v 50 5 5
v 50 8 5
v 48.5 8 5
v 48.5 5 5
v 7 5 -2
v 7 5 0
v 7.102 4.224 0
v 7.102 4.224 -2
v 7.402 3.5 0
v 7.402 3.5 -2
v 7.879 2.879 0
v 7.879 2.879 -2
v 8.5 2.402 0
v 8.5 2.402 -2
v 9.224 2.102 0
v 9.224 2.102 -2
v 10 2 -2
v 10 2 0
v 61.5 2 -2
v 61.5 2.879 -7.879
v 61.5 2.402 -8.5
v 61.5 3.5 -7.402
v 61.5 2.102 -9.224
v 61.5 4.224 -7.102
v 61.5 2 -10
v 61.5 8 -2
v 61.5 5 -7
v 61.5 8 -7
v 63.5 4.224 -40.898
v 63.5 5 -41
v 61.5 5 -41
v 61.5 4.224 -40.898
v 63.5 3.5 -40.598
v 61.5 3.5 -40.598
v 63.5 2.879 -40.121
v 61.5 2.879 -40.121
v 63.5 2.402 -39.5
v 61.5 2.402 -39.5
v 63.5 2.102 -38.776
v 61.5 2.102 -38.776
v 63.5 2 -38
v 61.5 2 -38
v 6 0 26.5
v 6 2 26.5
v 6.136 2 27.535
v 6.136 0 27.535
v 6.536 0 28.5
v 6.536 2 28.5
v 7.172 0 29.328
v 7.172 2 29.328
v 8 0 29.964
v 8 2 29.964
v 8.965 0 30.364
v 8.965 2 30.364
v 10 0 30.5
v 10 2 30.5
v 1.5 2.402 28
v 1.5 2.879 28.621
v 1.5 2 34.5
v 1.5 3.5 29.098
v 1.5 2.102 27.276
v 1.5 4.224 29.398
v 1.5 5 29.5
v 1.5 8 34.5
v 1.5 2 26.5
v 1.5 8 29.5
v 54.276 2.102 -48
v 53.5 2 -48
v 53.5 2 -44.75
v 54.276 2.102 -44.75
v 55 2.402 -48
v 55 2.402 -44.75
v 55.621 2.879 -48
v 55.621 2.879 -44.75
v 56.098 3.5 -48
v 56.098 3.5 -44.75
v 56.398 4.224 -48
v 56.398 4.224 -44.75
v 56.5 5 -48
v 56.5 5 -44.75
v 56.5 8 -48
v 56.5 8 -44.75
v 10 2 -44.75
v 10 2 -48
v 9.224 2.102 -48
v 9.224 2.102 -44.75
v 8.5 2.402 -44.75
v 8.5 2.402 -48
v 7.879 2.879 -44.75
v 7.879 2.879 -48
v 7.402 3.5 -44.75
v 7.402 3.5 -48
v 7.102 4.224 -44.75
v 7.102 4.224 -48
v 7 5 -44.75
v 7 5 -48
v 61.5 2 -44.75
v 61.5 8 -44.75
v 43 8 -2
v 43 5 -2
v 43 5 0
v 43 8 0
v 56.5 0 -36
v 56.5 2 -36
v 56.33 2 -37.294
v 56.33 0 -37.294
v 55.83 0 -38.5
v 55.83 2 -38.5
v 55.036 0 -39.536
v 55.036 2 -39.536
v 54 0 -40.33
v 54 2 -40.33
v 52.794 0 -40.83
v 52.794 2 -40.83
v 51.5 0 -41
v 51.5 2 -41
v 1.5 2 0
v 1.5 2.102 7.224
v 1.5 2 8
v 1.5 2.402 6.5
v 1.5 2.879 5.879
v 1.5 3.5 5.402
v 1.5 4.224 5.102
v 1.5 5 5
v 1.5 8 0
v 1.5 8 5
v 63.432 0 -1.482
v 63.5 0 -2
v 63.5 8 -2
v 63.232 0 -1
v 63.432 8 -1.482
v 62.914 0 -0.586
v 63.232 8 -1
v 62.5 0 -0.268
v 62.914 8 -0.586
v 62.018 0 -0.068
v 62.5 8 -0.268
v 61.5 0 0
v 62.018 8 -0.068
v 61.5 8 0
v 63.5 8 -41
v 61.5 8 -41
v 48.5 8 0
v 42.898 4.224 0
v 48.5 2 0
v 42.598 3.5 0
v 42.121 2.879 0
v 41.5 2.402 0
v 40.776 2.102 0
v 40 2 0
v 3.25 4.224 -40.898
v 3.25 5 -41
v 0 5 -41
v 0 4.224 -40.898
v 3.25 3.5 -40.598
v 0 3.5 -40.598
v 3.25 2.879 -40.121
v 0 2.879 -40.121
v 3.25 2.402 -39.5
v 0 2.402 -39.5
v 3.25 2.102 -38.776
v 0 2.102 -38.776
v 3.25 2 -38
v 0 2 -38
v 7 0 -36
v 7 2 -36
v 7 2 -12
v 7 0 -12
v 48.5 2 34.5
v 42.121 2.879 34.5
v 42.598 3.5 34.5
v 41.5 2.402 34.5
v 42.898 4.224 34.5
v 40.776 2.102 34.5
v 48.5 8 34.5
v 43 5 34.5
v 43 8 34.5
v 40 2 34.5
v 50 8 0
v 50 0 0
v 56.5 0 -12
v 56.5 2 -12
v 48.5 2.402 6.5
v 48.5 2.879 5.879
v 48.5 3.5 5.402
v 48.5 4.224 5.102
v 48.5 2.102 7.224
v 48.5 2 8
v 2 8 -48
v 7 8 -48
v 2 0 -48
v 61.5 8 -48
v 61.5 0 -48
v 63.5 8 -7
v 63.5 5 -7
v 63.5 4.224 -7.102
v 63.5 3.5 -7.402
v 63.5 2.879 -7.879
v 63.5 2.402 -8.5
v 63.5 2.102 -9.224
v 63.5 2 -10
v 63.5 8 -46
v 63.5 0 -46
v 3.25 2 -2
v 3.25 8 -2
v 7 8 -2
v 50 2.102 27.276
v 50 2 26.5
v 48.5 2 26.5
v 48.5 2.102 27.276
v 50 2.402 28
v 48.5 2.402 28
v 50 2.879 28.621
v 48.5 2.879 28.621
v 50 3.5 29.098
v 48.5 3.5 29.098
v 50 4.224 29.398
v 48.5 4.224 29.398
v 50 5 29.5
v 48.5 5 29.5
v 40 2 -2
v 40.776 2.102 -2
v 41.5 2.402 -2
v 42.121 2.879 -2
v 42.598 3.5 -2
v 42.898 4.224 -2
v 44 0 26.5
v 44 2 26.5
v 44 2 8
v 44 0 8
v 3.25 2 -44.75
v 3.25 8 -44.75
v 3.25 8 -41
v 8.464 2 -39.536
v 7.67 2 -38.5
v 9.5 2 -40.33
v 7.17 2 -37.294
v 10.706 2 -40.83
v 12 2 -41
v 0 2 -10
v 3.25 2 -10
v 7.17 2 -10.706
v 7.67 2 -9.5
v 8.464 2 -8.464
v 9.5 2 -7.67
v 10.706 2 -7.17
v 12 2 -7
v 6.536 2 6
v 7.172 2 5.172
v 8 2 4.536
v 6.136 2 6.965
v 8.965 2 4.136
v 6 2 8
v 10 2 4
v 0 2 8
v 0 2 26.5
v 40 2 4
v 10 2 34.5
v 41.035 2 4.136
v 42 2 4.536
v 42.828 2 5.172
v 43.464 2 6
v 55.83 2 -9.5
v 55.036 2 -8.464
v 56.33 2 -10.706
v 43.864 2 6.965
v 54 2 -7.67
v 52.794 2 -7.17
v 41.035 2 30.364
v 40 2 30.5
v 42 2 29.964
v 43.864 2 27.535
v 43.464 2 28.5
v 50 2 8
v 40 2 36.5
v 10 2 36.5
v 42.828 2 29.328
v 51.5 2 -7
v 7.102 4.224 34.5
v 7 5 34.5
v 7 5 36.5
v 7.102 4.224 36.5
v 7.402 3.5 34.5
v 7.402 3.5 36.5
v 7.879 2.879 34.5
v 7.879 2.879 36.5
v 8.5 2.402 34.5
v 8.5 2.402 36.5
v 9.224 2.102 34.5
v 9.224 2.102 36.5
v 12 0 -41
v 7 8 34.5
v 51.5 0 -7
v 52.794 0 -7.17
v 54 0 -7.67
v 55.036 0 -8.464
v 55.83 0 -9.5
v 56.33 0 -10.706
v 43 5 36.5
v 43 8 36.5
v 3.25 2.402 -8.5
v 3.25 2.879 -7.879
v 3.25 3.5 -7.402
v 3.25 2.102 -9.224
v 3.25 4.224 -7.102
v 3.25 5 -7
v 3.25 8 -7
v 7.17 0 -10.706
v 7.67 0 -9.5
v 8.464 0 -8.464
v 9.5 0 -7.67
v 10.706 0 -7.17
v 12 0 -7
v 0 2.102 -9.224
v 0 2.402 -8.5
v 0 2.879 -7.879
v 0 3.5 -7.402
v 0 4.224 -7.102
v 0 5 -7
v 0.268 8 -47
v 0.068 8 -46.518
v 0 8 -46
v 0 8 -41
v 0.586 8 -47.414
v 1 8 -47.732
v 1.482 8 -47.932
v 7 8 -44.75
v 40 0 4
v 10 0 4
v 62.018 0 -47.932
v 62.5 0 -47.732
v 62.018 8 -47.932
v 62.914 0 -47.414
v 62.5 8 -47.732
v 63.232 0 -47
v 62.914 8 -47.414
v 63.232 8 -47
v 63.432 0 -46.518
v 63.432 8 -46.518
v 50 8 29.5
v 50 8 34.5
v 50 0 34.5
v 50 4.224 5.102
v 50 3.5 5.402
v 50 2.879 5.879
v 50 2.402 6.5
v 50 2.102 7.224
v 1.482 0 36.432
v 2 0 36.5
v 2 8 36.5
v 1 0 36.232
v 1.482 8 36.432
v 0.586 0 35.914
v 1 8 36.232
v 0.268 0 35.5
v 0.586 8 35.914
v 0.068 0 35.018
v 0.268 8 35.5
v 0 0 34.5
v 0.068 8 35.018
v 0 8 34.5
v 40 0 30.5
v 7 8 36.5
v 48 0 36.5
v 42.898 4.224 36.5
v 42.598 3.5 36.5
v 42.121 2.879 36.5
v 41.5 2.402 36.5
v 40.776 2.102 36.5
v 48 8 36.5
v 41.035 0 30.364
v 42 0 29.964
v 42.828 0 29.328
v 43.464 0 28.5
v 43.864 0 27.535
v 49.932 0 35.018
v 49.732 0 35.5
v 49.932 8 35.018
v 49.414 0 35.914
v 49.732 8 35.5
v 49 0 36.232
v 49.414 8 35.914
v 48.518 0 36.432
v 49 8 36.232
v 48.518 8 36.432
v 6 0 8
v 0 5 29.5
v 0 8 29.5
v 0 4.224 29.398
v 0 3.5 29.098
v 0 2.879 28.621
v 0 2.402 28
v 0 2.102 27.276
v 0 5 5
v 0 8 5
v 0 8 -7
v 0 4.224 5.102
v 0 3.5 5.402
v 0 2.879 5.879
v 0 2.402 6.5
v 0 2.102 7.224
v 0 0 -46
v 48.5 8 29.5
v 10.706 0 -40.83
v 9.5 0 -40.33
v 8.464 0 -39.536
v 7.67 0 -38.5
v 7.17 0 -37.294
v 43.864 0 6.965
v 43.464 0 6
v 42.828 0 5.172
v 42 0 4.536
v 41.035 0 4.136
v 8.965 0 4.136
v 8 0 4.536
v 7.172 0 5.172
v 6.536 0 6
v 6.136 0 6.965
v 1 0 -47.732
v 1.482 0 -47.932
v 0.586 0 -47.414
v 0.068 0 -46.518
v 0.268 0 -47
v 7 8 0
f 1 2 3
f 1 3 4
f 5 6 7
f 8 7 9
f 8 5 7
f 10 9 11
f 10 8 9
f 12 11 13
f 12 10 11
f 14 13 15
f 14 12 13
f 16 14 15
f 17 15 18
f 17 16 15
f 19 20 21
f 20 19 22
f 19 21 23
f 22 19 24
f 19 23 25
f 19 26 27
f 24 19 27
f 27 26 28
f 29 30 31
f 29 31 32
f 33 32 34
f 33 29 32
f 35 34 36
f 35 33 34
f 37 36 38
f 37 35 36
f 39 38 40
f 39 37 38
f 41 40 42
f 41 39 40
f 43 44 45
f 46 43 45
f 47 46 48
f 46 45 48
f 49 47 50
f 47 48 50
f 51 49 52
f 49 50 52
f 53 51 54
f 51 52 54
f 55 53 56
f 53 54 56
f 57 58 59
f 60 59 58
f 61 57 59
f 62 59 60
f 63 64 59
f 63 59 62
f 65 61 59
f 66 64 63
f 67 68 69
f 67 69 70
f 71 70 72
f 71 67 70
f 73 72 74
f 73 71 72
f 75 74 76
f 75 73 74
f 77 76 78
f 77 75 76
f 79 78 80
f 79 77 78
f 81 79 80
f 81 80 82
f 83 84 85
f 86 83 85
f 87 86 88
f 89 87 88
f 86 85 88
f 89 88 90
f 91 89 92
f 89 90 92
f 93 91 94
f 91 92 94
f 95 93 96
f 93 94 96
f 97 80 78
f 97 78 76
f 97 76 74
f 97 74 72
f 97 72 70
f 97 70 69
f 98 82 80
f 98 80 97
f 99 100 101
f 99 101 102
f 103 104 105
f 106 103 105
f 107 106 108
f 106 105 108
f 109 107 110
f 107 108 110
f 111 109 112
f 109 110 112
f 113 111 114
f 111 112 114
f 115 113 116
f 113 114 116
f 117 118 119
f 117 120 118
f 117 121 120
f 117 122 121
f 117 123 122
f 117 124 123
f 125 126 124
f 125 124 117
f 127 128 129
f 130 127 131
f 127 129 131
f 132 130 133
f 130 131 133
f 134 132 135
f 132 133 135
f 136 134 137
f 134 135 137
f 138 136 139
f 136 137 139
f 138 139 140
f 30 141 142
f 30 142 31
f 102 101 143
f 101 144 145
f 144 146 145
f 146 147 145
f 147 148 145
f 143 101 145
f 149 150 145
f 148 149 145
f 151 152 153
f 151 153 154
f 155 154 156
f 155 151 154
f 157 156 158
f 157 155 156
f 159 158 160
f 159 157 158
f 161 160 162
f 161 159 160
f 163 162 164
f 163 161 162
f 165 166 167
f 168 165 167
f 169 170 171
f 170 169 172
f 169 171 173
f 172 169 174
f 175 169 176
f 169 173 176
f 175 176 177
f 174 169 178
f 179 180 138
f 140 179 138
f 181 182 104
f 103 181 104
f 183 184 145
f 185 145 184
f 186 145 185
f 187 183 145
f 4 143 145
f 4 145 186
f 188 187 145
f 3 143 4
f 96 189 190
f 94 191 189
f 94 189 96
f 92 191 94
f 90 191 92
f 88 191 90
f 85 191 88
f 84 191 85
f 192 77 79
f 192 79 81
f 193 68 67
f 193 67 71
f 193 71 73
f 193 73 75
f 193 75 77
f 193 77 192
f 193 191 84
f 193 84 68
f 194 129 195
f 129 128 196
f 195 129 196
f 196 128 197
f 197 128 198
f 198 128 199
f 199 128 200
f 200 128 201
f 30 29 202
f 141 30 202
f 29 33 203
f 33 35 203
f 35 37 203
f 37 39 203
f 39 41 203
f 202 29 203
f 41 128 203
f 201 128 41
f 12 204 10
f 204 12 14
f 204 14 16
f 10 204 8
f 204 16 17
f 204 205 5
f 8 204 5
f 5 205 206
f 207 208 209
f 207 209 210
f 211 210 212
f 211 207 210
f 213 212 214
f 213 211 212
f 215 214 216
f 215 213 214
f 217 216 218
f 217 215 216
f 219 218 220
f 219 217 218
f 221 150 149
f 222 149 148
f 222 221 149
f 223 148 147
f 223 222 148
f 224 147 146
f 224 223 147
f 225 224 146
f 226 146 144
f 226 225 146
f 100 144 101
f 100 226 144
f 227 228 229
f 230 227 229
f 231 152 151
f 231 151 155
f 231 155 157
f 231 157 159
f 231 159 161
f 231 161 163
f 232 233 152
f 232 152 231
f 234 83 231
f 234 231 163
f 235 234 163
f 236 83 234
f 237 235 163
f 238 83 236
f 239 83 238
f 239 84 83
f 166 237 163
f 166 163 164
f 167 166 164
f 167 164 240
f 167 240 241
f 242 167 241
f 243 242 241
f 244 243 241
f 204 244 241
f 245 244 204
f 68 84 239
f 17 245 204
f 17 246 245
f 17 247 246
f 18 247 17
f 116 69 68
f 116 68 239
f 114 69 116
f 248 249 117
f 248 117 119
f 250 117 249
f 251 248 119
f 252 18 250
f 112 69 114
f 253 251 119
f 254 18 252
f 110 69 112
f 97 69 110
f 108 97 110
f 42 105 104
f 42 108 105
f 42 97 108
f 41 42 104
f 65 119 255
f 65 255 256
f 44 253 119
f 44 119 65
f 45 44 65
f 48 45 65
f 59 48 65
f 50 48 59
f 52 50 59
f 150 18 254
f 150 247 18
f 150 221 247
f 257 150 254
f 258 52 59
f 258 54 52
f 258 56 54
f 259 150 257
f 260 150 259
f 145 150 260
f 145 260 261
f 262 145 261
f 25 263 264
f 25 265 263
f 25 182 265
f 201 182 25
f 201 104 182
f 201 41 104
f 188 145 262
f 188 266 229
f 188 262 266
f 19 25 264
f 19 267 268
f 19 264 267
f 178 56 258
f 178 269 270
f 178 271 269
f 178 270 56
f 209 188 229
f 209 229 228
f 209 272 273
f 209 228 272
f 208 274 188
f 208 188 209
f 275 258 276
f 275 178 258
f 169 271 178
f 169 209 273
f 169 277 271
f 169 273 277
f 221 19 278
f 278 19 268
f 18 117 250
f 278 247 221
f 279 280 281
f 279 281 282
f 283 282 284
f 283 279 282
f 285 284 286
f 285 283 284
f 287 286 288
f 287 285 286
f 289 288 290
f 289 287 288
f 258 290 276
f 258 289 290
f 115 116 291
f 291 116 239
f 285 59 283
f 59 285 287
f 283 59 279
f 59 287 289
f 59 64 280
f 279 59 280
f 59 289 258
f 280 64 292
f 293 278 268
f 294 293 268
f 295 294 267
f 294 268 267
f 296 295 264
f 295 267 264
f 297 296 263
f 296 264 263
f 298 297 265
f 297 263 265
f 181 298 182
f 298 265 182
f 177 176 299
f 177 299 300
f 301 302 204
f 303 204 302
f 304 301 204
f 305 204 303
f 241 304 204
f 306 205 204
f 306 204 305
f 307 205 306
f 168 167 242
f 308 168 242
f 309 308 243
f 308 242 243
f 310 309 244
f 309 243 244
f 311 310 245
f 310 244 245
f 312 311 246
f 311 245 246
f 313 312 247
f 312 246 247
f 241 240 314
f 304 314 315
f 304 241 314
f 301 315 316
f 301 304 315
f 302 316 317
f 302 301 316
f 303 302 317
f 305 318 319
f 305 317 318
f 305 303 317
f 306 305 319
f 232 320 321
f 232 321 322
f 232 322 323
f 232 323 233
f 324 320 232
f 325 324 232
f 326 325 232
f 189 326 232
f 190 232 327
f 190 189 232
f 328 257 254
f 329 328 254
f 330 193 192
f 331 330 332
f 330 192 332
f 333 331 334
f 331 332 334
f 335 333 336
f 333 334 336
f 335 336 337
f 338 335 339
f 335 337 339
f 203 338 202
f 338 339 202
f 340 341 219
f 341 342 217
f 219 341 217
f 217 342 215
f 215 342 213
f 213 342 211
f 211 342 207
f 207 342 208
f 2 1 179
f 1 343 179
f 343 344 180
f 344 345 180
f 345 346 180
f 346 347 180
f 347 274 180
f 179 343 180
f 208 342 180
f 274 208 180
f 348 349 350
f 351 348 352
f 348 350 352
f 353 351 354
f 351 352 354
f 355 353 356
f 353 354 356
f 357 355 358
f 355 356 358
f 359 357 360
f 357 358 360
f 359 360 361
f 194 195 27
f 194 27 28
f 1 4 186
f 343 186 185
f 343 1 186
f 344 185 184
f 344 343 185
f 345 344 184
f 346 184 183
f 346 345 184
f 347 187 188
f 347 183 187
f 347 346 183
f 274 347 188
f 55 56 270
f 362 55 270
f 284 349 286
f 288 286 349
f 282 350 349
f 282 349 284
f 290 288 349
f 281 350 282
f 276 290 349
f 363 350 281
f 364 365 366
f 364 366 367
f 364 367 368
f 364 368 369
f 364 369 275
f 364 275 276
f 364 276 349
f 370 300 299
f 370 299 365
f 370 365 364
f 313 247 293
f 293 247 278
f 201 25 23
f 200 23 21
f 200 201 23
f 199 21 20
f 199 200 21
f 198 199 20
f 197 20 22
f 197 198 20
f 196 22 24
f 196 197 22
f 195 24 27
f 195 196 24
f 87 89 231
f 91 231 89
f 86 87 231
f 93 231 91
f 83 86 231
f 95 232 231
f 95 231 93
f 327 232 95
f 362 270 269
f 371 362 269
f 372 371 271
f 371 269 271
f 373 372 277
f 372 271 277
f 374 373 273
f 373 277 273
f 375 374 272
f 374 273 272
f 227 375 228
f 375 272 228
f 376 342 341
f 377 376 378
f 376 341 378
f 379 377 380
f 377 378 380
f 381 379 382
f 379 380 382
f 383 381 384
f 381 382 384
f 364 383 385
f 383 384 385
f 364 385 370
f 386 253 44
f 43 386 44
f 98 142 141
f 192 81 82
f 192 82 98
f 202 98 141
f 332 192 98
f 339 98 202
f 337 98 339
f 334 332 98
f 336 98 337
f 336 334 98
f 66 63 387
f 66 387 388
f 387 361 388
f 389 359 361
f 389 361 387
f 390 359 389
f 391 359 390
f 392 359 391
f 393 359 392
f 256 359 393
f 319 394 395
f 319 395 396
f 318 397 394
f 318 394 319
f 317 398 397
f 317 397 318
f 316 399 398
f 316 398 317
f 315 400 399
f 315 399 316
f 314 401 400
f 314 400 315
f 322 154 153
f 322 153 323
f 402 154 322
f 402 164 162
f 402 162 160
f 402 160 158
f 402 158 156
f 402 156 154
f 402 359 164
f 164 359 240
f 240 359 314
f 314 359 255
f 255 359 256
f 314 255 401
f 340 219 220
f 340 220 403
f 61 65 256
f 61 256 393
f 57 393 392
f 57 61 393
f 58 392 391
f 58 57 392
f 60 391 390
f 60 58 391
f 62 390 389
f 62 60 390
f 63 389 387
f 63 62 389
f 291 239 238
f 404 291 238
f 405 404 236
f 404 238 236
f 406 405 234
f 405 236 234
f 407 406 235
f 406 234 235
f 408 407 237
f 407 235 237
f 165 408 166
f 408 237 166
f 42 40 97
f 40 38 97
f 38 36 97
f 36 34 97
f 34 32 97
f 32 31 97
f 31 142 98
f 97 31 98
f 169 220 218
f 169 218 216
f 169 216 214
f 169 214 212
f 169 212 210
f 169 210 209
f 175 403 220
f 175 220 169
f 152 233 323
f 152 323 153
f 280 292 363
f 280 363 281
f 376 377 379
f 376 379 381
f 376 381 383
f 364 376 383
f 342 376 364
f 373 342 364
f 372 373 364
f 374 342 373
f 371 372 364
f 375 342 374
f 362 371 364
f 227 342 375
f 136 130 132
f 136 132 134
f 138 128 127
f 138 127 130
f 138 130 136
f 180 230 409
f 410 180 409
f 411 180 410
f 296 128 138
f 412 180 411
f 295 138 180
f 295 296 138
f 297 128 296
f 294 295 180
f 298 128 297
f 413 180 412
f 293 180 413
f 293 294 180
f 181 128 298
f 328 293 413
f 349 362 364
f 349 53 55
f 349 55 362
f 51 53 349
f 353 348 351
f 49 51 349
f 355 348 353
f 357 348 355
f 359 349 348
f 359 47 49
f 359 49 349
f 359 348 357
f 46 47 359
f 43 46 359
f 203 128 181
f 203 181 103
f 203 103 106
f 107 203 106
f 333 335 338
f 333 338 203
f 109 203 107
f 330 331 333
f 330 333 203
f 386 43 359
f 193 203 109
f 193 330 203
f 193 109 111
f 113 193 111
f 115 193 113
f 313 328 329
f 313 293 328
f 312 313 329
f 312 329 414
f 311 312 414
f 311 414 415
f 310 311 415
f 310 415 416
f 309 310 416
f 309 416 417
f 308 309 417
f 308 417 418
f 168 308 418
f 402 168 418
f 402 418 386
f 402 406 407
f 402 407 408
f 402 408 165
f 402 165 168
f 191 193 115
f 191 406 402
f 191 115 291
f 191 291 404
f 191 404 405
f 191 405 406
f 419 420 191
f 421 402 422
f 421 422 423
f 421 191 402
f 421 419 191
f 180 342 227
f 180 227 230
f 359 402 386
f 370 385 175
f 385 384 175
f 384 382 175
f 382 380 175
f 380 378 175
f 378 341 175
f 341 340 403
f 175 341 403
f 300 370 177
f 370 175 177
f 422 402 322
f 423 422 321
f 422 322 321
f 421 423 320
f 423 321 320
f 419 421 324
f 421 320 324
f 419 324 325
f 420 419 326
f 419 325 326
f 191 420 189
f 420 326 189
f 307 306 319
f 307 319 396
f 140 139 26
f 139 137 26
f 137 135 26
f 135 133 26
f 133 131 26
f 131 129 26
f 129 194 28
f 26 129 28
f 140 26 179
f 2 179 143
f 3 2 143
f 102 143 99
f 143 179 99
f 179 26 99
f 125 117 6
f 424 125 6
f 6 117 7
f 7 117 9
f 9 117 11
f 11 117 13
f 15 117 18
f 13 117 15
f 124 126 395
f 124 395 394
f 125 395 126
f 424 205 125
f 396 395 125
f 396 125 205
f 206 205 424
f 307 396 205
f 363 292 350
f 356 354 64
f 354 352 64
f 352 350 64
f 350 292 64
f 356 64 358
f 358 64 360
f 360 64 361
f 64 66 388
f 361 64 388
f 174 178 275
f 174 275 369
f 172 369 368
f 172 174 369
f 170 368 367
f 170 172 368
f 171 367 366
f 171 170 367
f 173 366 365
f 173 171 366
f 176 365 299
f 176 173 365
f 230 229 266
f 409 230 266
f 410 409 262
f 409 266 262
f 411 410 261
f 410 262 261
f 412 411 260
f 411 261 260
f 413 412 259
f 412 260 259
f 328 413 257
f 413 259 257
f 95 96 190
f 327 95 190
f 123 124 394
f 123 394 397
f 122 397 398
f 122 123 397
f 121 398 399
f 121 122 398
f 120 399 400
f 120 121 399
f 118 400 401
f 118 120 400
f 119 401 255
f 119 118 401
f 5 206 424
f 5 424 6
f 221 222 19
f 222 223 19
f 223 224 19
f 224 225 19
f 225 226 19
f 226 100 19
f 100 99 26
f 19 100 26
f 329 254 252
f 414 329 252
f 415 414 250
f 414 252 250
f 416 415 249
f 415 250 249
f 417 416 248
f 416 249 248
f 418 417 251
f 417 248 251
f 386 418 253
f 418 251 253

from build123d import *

# Parameters (mm, degrees)
SKETCH1_W            = 63.5
SKETCH1_H            = 48
BOSS_EXTRUDE6_DEPTH  = 21
SKETCH5_W            = 50
SKETCH5_H            = 38.5
BOSS_EXTRUDE7_DEPTH  = 11.5
SKETCH6_W            = 59.5
SKETCH6_H            = 44
CUT_EXTRUDE1_DEPTH   = 19
SKETCH7_W            = 46
SKETCH7_H            = 34.5
CUT_EXTRUDE2_DEPTH   = 9.5
SKETCH8_W            = 50
SKETCH8_H            = 11.5
CUT_EXTRUDE4_DEPTH   = 2
CUT_EXTRUDE6_DEPTH   = 2
CUT_EXTRUDE7_DEPTH   = 2
CUT_EXTRUDE10_DEPTH  = 72
CUT_EXTRUDE11_DEPTH  = 38
SKETCH16_W           = 67
SKETCH16_H           = 6.5
CUT_EXTRUDE13_DEPTH  = 79
CUT_EXTRUDE14_DEPTH  = 79
CUT_EXTRUDE15_DEPTH  = 79
FILLET1_R            = 2
FILLET2_R            = 2
FILLET3_R            = 2
FILLET4_R            = 2
FILLET5_R            = 2
SKETCH19_W           = 36.5
SKETCH19_H           = 2
CUT_EXTRUDE17_DEPTH  = 79
FILLET6_R            = 5
FILLET7_R            = 5
SKETCH20_W           = 4
SKETCH20_H           = 2
BOSS_EXTRUDE16_DEPTH = 18
SKETCH30_W           = 4
SKETCH30_H           = 1
BOSS_EXTRUDE17_DEPTH = 2
SKETCH33_W           = 4
SKETCH33_H           = 1.5
BOSS_EXTRUDE18_DEPTH = 4
SKETCH34_W           = 4
SKETCH34_H           = 1
BOSS_EXTRUDE19_DEPTH = 2
SKETCH36_W           = 4
SKETCH36_H           = 1
CUT_EXTRUDE21_DEPTH  = 2
CUT_EXTRUDE22_DEPTH  = 7
CUT_EXTRUDE25_DEPTH  = 7
SKETCH39_W           = 9.212342007
SKETCH39_H           = 18
CUT_EXTRUDE26_DEPTH  = 10
SKETCH40_W           = 63.5
SKETCH40_H           = 6.5
CUT_EXTRUDE27_DEPTH  = 117
SKETCH44_W           = 34.5
SKETCH44_H           = 6
CUT_EXTRUDE30_DEPTH  = 0.5
SKETCH45_W           = 34.5
SKETCH45_H           = 6
CUT_EXTRUDE31_DEPTH  = 0.5
SKETCH46_W           = 44
SKETCH46_H           = 6
BOSS_EXTRUDE20_DEPTH = 1.25
SKETCH47_W           = 58.25
SKETCH47_H           = 6
BOSS_EXTRUDE21_DEPTH = 1.25
CUT_EXTRUDE32_START  = -1.25
CUT_EXTRUDE32_DEPTH  = 1.25
CUT_EXTRUDE33_DEPTH  = 1.25


with BuildPart() as part:
    # Sketch1 → Boss-Extrude6 (new body)
    with BuildSketch(Plane(origin=(0, 0, 0), x_dir=(1, 0, 0), z_dir=(0, 1, 0))):
        with Locations((31.75, 24)):
            Rectangle(SKETCH1_W, SKETCH1_H)
    extrude(amount=BOSS_EXTRUDE6_DEPTH)

    # Sketch5 → Boss-Extrude7 (add)
    with BuildSketch(Plane(origin=(0, 0, 0), x_dir=(-1, 0, 0), z_dir=(0, -1, 0))):
        with Locations((-25, -19.25)):
            Rectangle(SKETCH5_W, SKETCH5_H)
    extrude(amount=-BOSS_EXTRUDE7_DEPTH)

    # Sketch6 → Cut-Extrude1 (cut)
    with BuildSketch(Plane(origin=(0, 21, 0), x_dir=(1, 0, 0), z_dir=(0, 1, 0))):
        with Locations((31.75, 24)):
            Rectangle(SKETCH6_W, SKETCH6_H)
    extrude(amount=-CUT_EXTRUDE1_DEPTH, mode=Mode.SUBTRACT)

    # Sketch7 → Cut-Extrude2 (cut)
    with BuildSketch(Plane(origin=(0, 11.5, 0), x_dir=(1, 0, 0), z_dir=(0, 1, 0))):
        with Locations((25, -17.25)):
            Rectangle(SKETCH7_W, SKETCH7_H)
    extrude(amount=-CUT_EXTRUDE2_DEPTH, mode=Mode.SUBTRACT)

    # Sketch8 → Cut-Extrude4 (cut)
    with BuildSketch(Plane.XY.offset(38.5)):
        with Locations((25, 5.75)):
            Rectangle(SKETCH8_W, SKETCH8_H)
    extrude(amount=-CUT_EXTRUDE4_DEPTH, mode=Mode.SUBTRACT)

    # Sketch10 → Cut-Extrude6 (cut)
    with BuildSketch(Plane(origin=(0, 2, 0), x_dir=(1, 0, 0), z_dir=(0, 1, 0))):
        with BuildLine():
            Line((12, 7), (51.5, 7))
            ThreePointArc((51.5, 7), (55.035533906, 8.464466094), (56.5, 12))
            Line((56.5, 12), (56.5, 36))
            ThreePointArc((56.5, 36), (55.035533906, 39.535533906), (51.5, 41))
            Line((51.5, 41), (12, 41))
            ThreePointArc((12, 41), (8.464466094, 39.535533906), (7, 36))
            Line((7, 36), (7, 12))
            ThreePointArc((7, 12), (8.464466094, 8.464466094), (12, 7))
        make_face()
    extrude(amount=-CUT_EXTRUDE6_DEPTH, mode=Mode.SUBTRACT)

    # Sketch11 → Cut-Extrude7 (cut)
    with BuildSketch(Plane(origin=(0, 2, 0), x_dir=(1, 0, 0), z_dir=(0, 1, 0))):
        with BuildLine():
            Line((10, -30.5), (40, -30.5))
            ThreePointArc((40, -30.5), (42.828427125, -29.328427125), (44, -26.5))
            Line((44, -26.5), (44, -8))
            ThreePointArc((44, -8), (42.828427125, -5.171572875), (40, -4))
            Line((40, -4), (10, -4))
            ThreePointArc((10, -4), (7.171572875, -5.171572875), (6, -8))
            Line((6, -8), (6, -26.5))
            ThreePointArc((6, -26.5), (7.171572875, -29.328427125), (10, -30.5))
        make_face()
    extrude(amount=-CUT_EXTRUDE7_DEPTH, mode=Mode.SUBTRACT)

    # Sketch13 → Cut-Extrude10 (cut)
    with BuildSketch(Plane(origin=(63.5, 0, 0), x_dir=(0, 0, -1), z_dir=(1, 0, 0))):
        with BuildLine():
            Line((7, 21), (41, 21))
            Line((41, 21), (41, 5))
            ThreePointArc((41, 5), (40.121320344, 2.878679656), (38, 2))
            Line((38, 2), (10, 2))
            ThreePointArc((10, 2), (7.878679656, 2.878679656), (7, 5))
            Line((7, 5), (7, 21))
        make_face()
    extrude(amount=-CUT_EXTRUDE10_DEPTH, mode=Mode.SUBTRACT)

    # Sketch14 → Cut-Extrude11 (cut)
    with BuildSketch(Plane(origin=(0, 0, -48), x_dir=(-1, 0, 0), z_dir=(0, 0, -1))):
        with BuildLine():
            Line((-56.5, 21), (-7, 21))
            Line((-7, 21), (-7, 5))
            ThreePointArc((-7, 5), (-7.878679656, 2.878679656), (-10, 2))
            Line((-10, 2), (-53.5, 2))
            ThreePointArc((-53.5, 2), (-55.621320344, 2.878679656), (-56.5, 5))
            Line((-56.5, 5), (-56.5, 21))
        make_face()
    extrude(amount=-CUT_EXTRUDE11_DEPTH, mode=Mode.SUBTRACT)

    # Sketch16 → Cut-Extrude13 (cut)
    with BuildSketch(Plane(origin=(63.5, 0, 0), x_dir=(0, 0, -1), z_dir=(1, 0, 0))):
        with Locations((14.5, 17.75)):
            Rectangle(SKETCH16_W, SKETCH16_H)
    extrude(amount=-CUT_EXTRUDE13_DEPTH, mode=Mode.SUBTRACT)

    # Sketch17 → Cut-Extrude14 (cut)
    with BuildSketch(Plane(origin=(0, 0, -2), x_dir=(-1, 0, 0), z_dir=(0, 0, -1))):
        with BuildLine():
            Line((-43, 14.5), (-7, 14.5))
            Line((-7, 14.5), (-7, 5))
            ThreePointArc((-7, 5), (-7.878679656, 2.878679656), (-10, 2))
            Line((-10, 2), (-40, 2))
            ThreePointArc((-40, 2), (-42.121320344, 2.878679656), (-43, 5))
            Line((-43, 5), (-43, 14.5))
        make_face()
    extrude(amount=-CUT_EXTRUDE14_DEPTH, mode=Mode.SUBTRACT)

    # Sketch18 → Cut-Extrude15 (cut)
    with BuildSketch(Plane(origin=(50, 0, 0), x_dir=(0, 0, -1), z_dir=(1, 0, 0))):
        with BuildLine():
            Line((-29.5, 11.5), (-5, 11.5))
            Line((-5, 11.5), (-5, 5))
            ThreePointArc((-5, 5), (-5.878679656, 2.878679656), (-8, 2))
            Line((-8, 2), (-26.5, 2))
            ThreePointArc((-26.5, 2), (-28.621320344, 2.878679656), (-29.5, 5))
            Line((-29.5, 5), (-29.5, 11.5))
        make_face()
    extrude(amount=-CUT_EXTRUDE15_DEPTH, mode=Mode.SUBTRACT)

    # Fillet1
    fillet1_edges = [part.edges().sort_by_distance(p)[0] for p in [
        (50, 5.75, 36.5),
    ]]
    fillet(fillet1_edges, radius=FILLET1_R)

    # Fillet2
    fillet2_edges = [part.edges().sort_by_distance(p)[0] for p in [
        (0, 5.75, 36.5),
    ]]
    fillet(fillet2_edges, radius=FILLET2_R)

    # Fillet3
    fillet3_edges = [part.edges().sort_by_distance(p)[0] for p in [
        (0, 7.25, -48),
    ]]
    fillet(fillet3_edges, radius=FILLET3_R)

    # Fillet4
    fillet4_edges = [part.edges().sort_by_distance(p)[0] for p in [
        (63.5, 7.25, -48),
    ]]
    fillet(fillet4_edges, radius=FILLET4_R)

    # Fillet5
    fillet5_edges = [part.edges().sort_by_distance(p)[0] for p in [
        (63.5, 7.25, 0),
    ]]
    fillet(fillet5_edges, radius=FILLET5_R)

    # Sketch19 → Cut-Extrude17 (cut)
    with BuildSketch(Plane(origin=(50, 0, 0), x_dir=(0, 0, -1), z_dir=(1, 0, 0))):
        with Locations((-18.25, 10.5)):
            Rectangle(SKETCH19_W, SKETCH19_H)
    extrude(amount=-CUT_EXTRUDE17_DEPTH, mode=Mode.SUBTRACT)

    # Fillet6
    fillet6_edges = [part.edges().sort_by_distance(p)[0] for p in [
        (1, 9.5, 0),
    ]]
    fillet(fillet6_edges, radius=FILLET6_R - 0.0001)  # a hair under: the kernel refuses the full size

    # Fillet7
    fillet7_edges = [part.edges().sort_by_distance(p)[0] for p in [
        (49, 9.5, 0),
    ]]
    fillet(fillet7_edges, radius=FILLET7_R - 0.0001)  # a hair under: the kernel refuses the full size

    # Sketch20 → Boss-Extrude16 (add)
    with BuildSketch(Plane(origin=(0, 2, 0), x_dir=(1, 0, 0), z_dir=(0, 1, 0))):
        with Locations((25, 1)):
            Rectangle(SKETCH20_W, SKETCH20_H)
    extrude(amount=BOSS_EXTRUDE16_DEPTH)

    # Sketch30 → Boss-Extrude17 (add)
    with BuildSketch(Plane.XY):
        with Locations((25, 19.5)):
            Rectangle(SKETCH30_W, SKETCH30_H)
    extrude(amount=BOSS_EXTRUDE17_DEPTH)

    # Sketch33 → Boss-Extrude18 (add)
    with BuildSketch(Plane.XY):
        with Locations((25, 12.75)):
            Rectangle(SKETCH33_W, SKETCH33_H)
    extrude(amount=BOSS_EXTRUDE18_DEPTH)

    # Sketch34 → Boss-Extrude19 (add)
    with BuildSketch(Plane(origin=(0, 0, -2), x_dir=(-1, 0, 0), z_dir=(0, 0, -1))):
        with Locations((-25, 19.5)):
            Rectangle(SKETCH34_W, SKETCH34_H)
    extrude(amount=BOSS_EXTRUDE19_DEPTH)

    # Sketch36 → Cut-Extrude21 (cut)
    with BuildSketch(Plane.XY.offset(2)):
        with Locations((25, 19.5)):
            Rectangle(SKETCH36_W, SKETCH36_H)
    extrude(amount=-CUT_EXTRUDE21_DEPTH, mode=Mode.SUBTRACT)

    # Sketch37 → Cut-Extrude22 (cut)
    with BuildSketch(Plane(origin=(27, 0, 0), x_dir=(0, 0, -1), z_dir=(1, 0, 0))):
        Polygon((0, 20), (4, 19.257089557), (4, 20), align=None)
    extrude(amount=-CUT_EXTRUDE22_DEPTH, mode=Mode.SUBTRACT)

    # Sketch38 → Cut-Extrude25 (cut)
    with BuildSketch(Plane(origin=(27, 0, 0), x_dir=(0, 0, -1), z_dir=(1, 0, 0))):
        Polygon((0, 13.5), (-4, 10.225610037), (-4, 13.5), align=None)
    extrude(amount=-CUT_EXTRUDE25_DEPTH, mode=Mode.SUBTRACT)

    # Sketch39 → Cut-Extrude26 (cut)
    with BuildSketch(Plane(origin=(27, 0, 0), x_dir=(0, 0, -1), z_dir=(1, 0, 0))):
        with Locations((2.773768612, 11)):
            Rectangle(SKETCH39_W, SKETCH39_H)
    extrude(amount=-CUT_EXTRUDE26_DEPTH, mode=Mode.SUBTRACT)

    # Sketch40 → Cut-Extrude27 (cut)
    with BuildSketch(Plane(origin=(0, 0, -48), x_dir=(-1, 0, 0), z_dir=(0, 0, -1))):
        with Locations((-31.75, 11.25)):
            Rectangle(SKETCH40_W, SKETCH40_H)
    extrude(amount=-CUT_EXTRUDE27_DEPTH, mode=Mode.SUBTRACT)

    # Sketch44 → Cut-Extrude30 (cut)
    with BuildSketch(Plane(origin=(2, 0, 0), x_dir=(0, 0, -1), z_dir=(1, 0, 0))):
        with Locations((-17.25, 5)):
            Rectangle(SKETCH44_W, SKETCH44_H)
    extrude(amount=-CUT_EXTRUDE30_DEPTH, mode=Mode.SUBTRACT)

    # Sketch45 → Cut-Extrude31 (cut)
    with BuildSketch(Plane.ZY.offset(-48)):
        with Locations((17.25, 5)):
            Rectangle(SKETCH45_W, SKETCH45_H)
    extrude(amount=-CUT_EXTRUDE31_DEPTH, mode=Mode.SUBTRACT)

    # Sketch46 → Boss-Extrude20 (add)
    with BuildSketch(Plane(origin=(2, 0, 0), x_dir=(0, 0, -1), z_dir=(1, 0, 0))):
        with Locations((24, 5)):
            Rectangle(SKETCH46_W, SKETCH46_H)
    extrude(amount=BOSS_EXTRUDE20_DEPTH)

    # Sketch47 → Boss-Extrude21 (add)
    with BuildSketch(Plane.XY.offset(-46)):
        with Locations((32.375, 5)):
            Rectangle(SKETCH47_W, SKETCH47_H)
    extrude(amount=BOSS_EXTRUDE21_DEPTH)

    # Sketch48 → Cut-Extrude32 (cut)
    with BuildSketch(Plane.ZY.offset(-2).offset(CUT_EXTRUDE32_START)):
        with BuildLine():
            Line((-7, 8), (-41, 8))
            Line((-41, 8), (-41, 5))
            ThreePointArc((-41, 5), (-40.121320344, 2.878679656), (-38, 2))
            Line((-38, 2), (-10, 2))
            ThreePointArc((-10, 2), (-7.878679656, 2.878679656), (-7, 5))
            Line((-7, 5), (-7, 8))
        make_face()
    extrude(amount=CUT_EXTRUDE32_DEPTH, mode=Mode.SUBTRACT)

    # Sketch49 → Cut-Extrude33 (cut)
    with BuildSketch(Plane(origin=(0, 0, -46), x_dir=(-1, 0, 0), z_dir=(0, 0, -1))):
        with BuildLine():
            Line((-7, 8), (-56.5, 8))
            Line((-56.5, 8), (-56.5, 5))
            ThreePointArc((-56.5, 5), (-55.621320344, 2.878679656), (-53.5, 2))
            Line((-53.5, 2), (-10, 2))
            ThreePointArc((-10, 2), (-7.878679656, 2.878679656), (-7, 5))
            Line((-7, 5), (-7, 8))
        make_face()
    extrude(amount=-CUT_EXTRUDE33_DEPTH, mode=Mode.SUBTRACT)


solid = part.part
